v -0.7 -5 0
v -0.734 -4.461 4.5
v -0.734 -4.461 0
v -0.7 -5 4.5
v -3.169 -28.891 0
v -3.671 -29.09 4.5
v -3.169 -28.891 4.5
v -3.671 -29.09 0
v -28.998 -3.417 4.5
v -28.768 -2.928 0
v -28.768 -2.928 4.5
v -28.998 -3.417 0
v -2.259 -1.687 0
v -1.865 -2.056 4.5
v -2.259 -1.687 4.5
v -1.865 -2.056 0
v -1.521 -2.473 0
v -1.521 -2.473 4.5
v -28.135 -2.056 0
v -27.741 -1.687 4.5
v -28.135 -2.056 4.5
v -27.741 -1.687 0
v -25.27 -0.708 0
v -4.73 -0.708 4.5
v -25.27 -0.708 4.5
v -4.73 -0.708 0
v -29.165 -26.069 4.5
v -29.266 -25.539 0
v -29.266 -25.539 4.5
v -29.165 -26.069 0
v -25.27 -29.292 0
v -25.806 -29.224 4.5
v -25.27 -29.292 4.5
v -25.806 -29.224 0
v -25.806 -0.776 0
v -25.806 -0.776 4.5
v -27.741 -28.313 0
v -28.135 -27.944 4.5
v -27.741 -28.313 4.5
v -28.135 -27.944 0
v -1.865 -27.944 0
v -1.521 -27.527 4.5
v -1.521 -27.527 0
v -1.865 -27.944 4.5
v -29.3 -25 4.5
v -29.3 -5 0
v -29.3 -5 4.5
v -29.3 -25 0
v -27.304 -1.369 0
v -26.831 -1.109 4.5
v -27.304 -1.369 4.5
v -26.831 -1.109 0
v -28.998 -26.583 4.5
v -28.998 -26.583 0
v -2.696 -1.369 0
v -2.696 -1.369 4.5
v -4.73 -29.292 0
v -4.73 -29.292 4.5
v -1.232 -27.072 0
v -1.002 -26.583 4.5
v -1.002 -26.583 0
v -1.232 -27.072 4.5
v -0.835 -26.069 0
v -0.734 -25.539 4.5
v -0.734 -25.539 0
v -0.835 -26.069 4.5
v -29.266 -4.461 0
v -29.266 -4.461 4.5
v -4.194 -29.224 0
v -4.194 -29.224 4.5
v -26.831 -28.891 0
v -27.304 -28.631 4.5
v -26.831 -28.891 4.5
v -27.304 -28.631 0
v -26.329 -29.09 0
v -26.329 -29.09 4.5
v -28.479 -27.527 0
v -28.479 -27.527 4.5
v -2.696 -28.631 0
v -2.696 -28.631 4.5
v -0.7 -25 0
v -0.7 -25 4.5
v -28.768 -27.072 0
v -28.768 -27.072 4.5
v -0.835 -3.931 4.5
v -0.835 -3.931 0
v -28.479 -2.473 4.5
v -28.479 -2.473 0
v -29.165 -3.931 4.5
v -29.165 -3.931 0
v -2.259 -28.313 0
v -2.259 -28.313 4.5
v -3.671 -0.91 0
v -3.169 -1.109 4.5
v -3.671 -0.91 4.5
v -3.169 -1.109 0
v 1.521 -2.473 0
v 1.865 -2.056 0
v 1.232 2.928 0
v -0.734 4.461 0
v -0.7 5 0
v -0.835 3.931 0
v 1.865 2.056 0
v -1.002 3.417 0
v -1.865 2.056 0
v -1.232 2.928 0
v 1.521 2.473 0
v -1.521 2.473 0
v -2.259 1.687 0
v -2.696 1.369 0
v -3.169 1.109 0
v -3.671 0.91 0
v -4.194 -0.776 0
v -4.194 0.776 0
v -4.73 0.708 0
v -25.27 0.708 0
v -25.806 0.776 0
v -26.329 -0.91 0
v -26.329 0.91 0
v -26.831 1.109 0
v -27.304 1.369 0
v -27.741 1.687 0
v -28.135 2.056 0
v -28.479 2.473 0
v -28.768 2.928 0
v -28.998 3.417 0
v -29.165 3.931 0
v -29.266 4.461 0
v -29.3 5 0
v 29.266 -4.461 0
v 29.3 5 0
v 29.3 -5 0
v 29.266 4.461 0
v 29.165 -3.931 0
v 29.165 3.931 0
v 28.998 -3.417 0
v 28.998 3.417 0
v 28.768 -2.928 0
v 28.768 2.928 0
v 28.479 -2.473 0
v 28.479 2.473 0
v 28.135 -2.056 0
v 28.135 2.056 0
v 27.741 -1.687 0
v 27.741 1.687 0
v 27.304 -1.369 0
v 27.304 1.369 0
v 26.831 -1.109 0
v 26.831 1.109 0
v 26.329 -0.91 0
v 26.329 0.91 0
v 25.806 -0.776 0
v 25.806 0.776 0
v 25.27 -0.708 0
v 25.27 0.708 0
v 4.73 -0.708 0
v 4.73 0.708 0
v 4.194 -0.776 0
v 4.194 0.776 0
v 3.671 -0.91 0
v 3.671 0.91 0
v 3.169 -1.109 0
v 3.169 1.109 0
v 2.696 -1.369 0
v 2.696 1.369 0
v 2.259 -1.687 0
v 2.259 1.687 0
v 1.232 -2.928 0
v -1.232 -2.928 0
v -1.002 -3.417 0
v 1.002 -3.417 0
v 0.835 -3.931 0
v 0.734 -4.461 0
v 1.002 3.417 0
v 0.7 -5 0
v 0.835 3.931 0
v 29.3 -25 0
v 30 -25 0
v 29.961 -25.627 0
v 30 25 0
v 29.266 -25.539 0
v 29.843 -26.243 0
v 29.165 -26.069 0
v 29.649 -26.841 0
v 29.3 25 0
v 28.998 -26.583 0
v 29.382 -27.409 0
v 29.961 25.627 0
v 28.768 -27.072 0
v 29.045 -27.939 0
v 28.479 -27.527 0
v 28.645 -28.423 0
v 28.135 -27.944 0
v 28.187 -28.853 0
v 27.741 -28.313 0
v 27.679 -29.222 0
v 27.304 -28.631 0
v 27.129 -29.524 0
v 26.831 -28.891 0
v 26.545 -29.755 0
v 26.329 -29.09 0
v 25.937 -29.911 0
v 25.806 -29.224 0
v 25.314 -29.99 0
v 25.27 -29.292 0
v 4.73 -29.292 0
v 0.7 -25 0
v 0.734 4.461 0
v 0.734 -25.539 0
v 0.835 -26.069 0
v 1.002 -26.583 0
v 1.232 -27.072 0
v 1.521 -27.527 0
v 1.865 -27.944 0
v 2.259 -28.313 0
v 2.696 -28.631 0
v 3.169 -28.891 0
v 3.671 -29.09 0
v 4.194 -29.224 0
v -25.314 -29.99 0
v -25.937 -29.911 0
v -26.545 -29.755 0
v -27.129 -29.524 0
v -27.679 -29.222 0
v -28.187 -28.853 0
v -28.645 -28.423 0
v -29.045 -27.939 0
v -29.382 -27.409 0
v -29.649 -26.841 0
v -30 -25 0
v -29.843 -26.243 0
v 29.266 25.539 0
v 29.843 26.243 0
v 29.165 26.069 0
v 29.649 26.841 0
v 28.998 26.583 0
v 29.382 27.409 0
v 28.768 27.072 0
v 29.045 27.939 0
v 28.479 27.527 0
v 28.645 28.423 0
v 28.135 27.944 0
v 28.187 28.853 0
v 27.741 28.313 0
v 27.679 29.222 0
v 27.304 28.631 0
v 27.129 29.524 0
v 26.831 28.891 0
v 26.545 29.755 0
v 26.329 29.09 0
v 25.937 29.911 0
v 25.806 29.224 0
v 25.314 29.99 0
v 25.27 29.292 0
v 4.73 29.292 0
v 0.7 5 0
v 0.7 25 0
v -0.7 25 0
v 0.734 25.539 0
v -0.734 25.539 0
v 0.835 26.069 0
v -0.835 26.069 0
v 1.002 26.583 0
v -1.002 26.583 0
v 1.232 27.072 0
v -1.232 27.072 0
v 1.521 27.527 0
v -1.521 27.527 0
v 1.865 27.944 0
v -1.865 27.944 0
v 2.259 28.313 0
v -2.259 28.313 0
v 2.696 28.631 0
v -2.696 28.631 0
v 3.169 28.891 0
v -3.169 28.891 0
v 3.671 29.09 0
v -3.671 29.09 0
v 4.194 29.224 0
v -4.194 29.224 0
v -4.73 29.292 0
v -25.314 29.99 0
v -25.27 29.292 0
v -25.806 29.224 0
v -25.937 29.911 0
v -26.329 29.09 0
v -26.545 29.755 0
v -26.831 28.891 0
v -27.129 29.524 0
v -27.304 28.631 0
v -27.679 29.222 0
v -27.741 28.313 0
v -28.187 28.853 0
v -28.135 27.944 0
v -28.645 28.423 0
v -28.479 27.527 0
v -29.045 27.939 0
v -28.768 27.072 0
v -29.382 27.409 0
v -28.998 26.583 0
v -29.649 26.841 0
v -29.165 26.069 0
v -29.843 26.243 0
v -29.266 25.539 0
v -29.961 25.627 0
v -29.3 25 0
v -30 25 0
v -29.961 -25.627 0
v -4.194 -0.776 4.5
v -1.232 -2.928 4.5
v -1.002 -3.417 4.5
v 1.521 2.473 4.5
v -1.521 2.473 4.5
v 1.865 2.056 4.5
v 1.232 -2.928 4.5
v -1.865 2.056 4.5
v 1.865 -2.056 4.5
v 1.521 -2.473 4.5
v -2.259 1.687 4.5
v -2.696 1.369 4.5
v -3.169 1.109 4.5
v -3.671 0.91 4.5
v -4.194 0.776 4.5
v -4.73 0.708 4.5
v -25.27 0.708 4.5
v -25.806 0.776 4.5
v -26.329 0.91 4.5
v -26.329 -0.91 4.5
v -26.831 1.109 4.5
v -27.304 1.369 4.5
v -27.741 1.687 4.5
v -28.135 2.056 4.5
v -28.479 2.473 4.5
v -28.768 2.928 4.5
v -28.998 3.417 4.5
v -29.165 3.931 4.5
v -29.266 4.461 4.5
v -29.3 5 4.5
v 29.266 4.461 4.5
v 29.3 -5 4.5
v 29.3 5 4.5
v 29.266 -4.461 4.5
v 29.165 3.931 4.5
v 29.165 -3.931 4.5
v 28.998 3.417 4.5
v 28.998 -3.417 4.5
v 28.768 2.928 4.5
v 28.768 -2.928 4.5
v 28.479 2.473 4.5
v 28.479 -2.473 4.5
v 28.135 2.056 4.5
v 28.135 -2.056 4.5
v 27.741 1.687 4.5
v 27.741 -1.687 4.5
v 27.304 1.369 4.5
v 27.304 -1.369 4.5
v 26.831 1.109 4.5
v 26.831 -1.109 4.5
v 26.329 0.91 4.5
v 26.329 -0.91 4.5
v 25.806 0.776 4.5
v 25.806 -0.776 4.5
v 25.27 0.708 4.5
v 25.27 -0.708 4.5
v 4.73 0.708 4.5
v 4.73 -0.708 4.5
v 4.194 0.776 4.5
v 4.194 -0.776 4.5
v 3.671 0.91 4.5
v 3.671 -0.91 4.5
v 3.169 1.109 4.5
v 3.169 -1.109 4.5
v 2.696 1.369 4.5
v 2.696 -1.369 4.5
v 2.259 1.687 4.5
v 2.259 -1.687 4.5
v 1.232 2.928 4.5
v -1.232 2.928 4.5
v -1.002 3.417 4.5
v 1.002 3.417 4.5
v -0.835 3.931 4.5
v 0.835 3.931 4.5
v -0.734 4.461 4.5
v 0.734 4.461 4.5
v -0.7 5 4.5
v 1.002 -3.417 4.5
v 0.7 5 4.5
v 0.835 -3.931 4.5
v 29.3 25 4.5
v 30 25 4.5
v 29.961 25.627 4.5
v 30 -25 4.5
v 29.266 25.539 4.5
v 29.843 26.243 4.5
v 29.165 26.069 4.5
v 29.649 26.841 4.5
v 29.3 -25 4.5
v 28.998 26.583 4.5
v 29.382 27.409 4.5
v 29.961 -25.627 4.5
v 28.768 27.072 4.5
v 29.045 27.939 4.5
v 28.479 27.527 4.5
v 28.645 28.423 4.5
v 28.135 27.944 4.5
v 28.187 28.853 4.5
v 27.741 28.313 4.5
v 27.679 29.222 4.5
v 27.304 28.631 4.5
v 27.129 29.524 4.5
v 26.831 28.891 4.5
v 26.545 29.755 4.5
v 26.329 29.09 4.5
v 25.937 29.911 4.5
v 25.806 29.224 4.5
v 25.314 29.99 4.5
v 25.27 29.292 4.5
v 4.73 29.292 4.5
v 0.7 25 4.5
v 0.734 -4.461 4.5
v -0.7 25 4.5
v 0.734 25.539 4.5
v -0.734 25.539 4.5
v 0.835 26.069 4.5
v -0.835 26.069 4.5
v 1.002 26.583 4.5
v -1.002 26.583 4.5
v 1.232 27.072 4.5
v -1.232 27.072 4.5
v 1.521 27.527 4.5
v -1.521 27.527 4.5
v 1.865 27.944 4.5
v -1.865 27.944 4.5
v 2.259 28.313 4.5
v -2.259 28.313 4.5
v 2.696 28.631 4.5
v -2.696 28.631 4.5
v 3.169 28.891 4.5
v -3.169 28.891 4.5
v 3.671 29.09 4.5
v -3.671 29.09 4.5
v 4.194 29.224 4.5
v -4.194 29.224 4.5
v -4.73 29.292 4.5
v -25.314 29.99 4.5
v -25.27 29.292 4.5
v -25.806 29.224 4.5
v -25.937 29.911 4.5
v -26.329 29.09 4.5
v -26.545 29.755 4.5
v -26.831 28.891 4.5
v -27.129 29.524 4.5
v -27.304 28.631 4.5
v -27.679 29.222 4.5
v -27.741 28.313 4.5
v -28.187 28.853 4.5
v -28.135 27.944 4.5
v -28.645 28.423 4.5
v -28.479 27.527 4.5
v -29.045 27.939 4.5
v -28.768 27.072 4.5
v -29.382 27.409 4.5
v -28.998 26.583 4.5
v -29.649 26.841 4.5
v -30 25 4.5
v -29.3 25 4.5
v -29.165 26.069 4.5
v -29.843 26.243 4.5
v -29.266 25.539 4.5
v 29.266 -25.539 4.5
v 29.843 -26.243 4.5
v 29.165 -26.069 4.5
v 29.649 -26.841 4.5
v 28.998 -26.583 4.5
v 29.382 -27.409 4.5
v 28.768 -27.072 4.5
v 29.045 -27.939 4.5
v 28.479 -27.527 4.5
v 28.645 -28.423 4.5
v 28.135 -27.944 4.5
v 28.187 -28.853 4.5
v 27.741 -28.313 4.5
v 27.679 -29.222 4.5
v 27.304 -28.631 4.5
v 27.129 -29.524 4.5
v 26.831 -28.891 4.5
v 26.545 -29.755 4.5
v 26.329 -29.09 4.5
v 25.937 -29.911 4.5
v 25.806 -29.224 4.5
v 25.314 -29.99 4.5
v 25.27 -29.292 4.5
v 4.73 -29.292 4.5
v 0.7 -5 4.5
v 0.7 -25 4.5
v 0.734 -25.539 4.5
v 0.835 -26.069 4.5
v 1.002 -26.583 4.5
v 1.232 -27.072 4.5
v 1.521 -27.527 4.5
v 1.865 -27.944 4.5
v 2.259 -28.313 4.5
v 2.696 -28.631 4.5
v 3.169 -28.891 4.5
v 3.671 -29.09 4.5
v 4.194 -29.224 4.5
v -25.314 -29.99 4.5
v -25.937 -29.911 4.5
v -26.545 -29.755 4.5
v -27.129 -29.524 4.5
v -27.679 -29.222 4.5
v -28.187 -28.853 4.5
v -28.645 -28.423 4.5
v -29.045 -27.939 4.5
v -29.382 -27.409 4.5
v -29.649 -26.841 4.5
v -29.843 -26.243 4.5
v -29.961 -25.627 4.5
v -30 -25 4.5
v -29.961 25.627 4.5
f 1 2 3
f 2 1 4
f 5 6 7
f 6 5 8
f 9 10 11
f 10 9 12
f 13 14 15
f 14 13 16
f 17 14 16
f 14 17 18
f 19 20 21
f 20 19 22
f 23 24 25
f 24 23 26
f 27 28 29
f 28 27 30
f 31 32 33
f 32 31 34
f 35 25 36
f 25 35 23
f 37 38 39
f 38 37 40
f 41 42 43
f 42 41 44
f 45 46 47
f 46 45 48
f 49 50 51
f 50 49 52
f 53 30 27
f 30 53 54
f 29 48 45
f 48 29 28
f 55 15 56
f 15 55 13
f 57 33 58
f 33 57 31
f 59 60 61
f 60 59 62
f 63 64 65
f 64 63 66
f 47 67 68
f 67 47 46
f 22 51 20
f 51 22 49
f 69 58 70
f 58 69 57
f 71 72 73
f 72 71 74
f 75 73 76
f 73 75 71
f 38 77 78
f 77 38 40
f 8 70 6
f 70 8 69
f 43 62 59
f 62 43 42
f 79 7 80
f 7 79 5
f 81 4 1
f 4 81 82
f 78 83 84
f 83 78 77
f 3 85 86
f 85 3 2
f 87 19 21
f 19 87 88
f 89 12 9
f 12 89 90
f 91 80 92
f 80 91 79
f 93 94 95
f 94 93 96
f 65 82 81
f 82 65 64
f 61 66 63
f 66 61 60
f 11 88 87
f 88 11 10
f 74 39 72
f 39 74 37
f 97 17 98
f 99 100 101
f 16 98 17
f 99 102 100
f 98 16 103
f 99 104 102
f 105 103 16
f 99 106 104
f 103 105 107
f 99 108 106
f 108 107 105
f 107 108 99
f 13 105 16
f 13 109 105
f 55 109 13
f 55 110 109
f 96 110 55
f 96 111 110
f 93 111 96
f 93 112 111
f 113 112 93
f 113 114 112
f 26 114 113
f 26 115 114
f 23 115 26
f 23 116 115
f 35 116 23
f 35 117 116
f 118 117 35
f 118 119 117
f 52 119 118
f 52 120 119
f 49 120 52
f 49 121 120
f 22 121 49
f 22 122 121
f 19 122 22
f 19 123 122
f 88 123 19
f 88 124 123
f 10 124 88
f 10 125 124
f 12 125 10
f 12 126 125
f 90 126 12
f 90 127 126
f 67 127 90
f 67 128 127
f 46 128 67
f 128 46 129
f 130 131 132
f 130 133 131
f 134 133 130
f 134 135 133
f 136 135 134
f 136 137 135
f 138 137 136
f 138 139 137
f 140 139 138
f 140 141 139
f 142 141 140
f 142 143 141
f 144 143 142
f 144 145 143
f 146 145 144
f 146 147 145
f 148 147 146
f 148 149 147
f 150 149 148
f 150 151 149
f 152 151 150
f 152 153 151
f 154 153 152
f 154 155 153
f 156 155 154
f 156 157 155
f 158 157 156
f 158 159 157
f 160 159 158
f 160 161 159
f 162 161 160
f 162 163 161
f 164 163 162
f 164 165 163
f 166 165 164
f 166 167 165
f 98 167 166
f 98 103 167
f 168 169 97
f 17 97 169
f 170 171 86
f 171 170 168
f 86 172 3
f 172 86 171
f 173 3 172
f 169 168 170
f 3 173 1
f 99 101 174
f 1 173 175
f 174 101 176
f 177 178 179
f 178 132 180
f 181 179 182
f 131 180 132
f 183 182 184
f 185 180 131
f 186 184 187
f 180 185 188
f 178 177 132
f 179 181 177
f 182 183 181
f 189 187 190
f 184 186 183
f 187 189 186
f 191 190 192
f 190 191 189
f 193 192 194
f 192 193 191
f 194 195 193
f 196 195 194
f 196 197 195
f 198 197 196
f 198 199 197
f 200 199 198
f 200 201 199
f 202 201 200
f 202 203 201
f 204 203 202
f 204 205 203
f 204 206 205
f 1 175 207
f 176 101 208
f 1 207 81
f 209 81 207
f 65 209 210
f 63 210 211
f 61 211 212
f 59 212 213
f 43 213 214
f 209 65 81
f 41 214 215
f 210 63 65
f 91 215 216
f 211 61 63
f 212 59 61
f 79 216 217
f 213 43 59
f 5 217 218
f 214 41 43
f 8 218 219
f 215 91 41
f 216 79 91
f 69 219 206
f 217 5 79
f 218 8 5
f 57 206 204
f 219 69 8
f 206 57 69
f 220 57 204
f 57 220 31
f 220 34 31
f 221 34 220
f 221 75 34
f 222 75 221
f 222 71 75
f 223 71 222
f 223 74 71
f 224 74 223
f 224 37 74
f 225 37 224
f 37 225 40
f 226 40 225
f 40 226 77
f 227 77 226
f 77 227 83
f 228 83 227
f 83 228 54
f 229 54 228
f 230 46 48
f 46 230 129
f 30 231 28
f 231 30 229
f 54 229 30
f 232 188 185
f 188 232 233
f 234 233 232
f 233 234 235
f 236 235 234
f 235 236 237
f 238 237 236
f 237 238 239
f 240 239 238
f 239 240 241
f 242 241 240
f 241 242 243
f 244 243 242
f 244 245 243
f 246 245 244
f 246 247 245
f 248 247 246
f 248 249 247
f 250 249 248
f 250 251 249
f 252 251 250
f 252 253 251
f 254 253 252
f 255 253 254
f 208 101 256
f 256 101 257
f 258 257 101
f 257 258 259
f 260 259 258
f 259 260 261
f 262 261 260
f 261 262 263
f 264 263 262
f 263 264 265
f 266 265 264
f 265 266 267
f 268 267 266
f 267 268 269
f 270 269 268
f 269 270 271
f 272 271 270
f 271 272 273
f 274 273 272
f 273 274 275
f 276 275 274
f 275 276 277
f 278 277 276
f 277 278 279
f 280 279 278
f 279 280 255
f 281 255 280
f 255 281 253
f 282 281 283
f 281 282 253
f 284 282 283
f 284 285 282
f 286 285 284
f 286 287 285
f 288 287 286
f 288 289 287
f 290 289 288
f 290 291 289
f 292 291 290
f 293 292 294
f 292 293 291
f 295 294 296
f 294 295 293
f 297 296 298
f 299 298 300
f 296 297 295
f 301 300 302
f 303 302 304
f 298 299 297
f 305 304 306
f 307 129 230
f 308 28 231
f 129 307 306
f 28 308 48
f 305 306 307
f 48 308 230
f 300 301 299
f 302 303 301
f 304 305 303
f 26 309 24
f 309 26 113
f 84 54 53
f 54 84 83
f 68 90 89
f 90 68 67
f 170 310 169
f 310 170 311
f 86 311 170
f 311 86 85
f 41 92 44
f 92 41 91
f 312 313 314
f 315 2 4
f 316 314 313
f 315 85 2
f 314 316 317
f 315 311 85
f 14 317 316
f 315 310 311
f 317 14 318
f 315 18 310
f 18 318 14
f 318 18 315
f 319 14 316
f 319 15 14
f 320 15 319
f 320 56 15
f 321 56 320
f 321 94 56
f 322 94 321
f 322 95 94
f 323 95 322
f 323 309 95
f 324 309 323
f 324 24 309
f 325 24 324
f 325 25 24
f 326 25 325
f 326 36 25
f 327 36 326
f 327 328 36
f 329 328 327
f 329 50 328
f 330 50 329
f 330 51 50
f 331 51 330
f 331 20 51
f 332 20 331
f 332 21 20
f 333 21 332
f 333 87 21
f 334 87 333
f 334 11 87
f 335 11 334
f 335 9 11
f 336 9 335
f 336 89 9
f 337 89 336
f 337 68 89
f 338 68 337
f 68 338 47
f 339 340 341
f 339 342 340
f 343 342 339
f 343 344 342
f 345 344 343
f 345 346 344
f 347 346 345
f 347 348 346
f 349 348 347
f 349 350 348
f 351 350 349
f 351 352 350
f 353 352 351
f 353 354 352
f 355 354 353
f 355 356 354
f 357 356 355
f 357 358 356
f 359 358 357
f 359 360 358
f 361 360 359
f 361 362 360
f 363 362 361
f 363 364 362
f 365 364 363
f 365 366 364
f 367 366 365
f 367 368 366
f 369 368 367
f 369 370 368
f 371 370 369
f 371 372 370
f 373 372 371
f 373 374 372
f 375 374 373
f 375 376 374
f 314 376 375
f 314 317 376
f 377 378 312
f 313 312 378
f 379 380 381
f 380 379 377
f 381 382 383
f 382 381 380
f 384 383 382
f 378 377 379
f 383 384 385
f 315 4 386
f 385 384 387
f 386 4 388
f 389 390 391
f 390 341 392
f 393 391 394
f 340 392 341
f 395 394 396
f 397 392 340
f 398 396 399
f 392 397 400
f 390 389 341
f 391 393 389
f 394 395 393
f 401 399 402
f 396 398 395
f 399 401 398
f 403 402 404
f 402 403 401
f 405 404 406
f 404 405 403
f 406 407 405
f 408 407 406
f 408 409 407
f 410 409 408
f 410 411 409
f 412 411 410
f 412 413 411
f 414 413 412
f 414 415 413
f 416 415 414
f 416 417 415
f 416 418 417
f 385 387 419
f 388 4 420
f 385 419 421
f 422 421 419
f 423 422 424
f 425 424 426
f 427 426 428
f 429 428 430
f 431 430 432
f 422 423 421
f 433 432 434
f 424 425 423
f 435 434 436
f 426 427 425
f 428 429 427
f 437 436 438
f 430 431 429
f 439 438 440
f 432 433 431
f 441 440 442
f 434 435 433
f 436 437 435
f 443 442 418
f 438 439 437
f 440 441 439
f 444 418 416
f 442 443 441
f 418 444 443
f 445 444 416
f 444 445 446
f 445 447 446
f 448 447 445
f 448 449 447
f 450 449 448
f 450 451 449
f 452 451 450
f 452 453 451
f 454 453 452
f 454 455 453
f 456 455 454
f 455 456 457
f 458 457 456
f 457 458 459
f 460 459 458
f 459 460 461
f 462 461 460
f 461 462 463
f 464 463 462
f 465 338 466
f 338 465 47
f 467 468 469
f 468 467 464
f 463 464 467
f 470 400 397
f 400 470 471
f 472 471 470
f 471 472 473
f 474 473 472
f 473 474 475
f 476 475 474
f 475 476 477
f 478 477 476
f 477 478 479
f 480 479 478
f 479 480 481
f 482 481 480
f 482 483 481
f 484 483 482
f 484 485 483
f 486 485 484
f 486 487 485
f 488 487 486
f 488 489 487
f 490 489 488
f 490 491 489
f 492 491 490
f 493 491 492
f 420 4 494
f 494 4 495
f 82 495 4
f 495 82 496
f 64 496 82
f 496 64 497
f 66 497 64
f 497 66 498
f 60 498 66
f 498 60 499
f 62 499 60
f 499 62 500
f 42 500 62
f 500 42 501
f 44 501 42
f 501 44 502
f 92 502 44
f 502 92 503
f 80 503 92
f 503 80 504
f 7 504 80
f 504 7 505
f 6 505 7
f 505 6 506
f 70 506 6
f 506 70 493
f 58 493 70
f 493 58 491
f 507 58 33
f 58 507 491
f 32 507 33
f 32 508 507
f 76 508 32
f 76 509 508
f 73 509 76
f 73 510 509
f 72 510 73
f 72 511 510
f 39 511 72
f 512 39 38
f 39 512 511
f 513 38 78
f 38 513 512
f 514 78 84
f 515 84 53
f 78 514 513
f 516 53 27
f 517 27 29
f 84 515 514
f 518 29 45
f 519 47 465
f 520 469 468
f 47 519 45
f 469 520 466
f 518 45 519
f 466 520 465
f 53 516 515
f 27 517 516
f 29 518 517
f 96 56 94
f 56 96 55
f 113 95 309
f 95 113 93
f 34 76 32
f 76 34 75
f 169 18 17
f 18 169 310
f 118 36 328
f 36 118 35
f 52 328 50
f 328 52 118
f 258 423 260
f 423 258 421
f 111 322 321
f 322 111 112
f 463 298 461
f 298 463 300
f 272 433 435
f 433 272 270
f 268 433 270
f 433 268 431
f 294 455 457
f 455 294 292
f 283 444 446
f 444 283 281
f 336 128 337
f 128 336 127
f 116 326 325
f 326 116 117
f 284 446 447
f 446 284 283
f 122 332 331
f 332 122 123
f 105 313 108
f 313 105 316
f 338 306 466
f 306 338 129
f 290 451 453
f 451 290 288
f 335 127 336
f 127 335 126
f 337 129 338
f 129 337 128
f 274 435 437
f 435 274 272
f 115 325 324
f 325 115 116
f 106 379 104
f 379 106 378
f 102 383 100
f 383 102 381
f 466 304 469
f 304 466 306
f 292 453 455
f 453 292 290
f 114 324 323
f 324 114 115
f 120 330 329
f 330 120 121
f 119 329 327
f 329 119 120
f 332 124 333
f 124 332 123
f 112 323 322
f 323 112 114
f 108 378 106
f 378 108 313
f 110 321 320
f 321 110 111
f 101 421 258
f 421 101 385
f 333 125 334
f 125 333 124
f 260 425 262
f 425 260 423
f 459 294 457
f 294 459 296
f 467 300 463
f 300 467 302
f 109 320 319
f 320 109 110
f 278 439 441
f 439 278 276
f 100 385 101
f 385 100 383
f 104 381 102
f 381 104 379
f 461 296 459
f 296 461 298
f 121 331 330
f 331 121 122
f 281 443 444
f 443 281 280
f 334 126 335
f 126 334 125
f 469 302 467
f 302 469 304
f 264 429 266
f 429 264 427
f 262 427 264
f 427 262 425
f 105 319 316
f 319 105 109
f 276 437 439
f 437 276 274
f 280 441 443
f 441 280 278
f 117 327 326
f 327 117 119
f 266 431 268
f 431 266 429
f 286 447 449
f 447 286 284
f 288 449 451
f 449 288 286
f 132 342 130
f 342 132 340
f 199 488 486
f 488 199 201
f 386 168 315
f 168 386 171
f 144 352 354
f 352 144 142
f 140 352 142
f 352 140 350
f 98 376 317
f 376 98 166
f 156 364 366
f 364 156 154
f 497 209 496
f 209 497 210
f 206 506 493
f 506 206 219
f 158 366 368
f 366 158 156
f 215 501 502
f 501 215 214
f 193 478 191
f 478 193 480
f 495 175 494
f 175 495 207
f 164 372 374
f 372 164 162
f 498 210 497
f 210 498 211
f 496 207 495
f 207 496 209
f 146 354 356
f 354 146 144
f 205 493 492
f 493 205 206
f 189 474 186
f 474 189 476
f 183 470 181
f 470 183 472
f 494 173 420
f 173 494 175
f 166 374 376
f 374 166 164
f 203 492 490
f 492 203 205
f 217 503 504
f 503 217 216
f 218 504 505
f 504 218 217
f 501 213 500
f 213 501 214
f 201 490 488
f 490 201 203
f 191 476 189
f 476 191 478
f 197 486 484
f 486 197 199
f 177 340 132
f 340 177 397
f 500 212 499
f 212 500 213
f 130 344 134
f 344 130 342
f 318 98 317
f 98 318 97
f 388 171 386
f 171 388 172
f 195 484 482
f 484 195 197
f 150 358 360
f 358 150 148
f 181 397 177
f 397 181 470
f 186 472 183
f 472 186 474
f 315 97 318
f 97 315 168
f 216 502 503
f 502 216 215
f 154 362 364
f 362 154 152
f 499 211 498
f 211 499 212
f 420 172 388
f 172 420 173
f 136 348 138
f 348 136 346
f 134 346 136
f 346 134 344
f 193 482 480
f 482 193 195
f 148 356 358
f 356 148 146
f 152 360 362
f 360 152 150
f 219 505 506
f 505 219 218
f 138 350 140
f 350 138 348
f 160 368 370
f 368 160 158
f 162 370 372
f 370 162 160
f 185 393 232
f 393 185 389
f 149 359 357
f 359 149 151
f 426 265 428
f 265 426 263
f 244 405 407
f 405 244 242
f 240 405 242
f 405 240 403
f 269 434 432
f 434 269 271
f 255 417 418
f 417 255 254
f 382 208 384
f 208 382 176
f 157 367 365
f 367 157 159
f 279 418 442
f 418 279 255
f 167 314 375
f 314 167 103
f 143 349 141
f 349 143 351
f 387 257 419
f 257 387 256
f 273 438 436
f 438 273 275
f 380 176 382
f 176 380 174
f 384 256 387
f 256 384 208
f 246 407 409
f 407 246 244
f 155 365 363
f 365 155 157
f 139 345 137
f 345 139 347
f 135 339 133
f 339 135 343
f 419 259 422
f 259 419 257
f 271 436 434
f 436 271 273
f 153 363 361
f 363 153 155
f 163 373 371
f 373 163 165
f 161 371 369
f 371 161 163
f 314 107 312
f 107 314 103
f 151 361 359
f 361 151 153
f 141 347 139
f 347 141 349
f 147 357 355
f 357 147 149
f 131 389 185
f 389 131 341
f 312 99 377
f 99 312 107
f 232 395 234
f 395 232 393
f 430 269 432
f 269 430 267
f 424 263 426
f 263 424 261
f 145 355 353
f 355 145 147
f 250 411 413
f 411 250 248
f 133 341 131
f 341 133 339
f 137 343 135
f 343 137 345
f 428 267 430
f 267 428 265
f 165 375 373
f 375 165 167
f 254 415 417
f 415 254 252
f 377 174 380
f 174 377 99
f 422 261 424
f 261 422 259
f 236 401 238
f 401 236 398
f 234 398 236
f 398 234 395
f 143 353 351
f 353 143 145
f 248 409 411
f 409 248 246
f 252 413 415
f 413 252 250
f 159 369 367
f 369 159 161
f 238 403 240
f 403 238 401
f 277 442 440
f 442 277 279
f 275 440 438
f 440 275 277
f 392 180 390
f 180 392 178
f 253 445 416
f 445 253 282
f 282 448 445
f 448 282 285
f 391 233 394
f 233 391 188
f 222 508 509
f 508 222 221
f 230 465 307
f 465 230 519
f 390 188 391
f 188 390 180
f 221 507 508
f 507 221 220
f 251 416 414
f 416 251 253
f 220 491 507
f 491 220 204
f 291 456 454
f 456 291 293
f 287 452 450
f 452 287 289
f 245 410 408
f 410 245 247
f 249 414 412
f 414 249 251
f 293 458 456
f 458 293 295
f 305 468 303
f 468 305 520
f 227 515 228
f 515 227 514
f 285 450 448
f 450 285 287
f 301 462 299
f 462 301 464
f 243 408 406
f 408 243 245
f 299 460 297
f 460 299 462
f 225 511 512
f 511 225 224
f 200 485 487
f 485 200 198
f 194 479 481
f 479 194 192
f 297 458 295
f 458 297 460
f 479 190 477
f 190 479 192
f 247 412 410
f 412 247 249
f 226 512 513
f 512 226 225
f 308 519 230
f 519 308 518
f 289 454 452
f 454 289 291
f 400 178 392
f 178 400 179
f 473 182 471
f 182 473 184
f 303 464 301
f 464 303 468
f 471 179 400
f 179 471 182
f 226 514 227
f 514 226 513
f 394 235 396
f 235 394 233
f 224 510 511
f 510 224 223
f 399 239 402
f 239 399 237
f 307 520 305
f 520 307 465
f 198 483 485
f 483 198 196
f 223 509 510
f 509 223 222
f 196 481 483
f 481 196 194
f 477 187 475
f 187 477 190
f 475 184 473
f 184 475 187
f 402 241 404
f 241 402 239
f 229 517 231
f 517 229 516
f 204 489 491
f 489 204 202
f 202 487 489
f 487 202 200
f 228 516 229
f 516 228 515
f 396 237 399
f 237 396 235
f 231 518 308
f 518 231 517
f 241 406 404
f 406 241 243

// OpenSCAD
$fn = 50;


difference() {
	union() {
		hull() {
			translate(v = [-25.0000000000, 25.0000000000, 0]) {
				cylinder(h = 4.5000000000, r = 5);
			}
			translate(v = [25.0000000000, 25.0000000000, 0]) {
				cylinder(h = 4.5000000000, r = 5);
			}
			translate(v = [-25.0000000000, -25.0000000000, 0]) {
				cylinder(h = 4.5000000000, r = 5);
			}
			translate(v = [25.0000000000, -25.0000000000, 0]) {
				cylinder(h = 4.5000000000, r = 5);
			}
		}
	}
	union() {
		translate(v = [-15.0000000000, -15.0000000000, 0]) {
			hull() {
				translate(v = [-10.0000000000, 10.0000000000, 0]) {
					cylinder(h = 4.5000000000, r = 4.3000000000);
				}
				translate(v = [10.0000000000, 10.0000000000, 0]) {
					cylinder(h = 4.5000000000, r = 4.3000000000);
				}
				translate(v = [-10.0000000000, -10.0000000000, 0]) {
					cylinder(h = 4.5000000000, r = 4.3000000000);
				}
				translate(v = [10.0000000000, -10.0000000000, 0]) {
					cylinder(h = 4.5000000000, r = 4.3000000000);
				}
			}
		}
		translate(v = [-15.0000000000, 15.0000000000, 0]) {
			hull() {
				translate(v = [-10.0000000000, 10.0000000000, 0]) {
					cylinder(h = 4.5000000000, r = 4.3000000000);
				}
				translate(v = [10.0000000000, 10.0000000000, 0]) {
					cylinder(h = 4.5000000000, r = 4.3000000000);
				}
				translate(v = [-10.0000000000, -10.0000000000, 0]) {
					cylinder(h = 4.5000000000, r = 4.3000000000);
				}
				translate(v = [10.0000000000, -10.0000000000, 0]) {
					cylinder(h = 4.5000000000, r = 4.3000000000);
				}
			}
		}
		translate(v = [15.0000000000, -15.0000000000, 0]) {
			hull() {
				translate(v = [-10.0000000000, 10.0000000000, 0]) {
					cylinder(h = 4.5000000000, r = 4.3000000000);
				}
				translate(v = [10.0000000000, 10.0000000000, 0]) {
					cylinder(h = 4.5000000000, r = 4.3000000000);
				}
				translate(v = [-10.0000000000, -10.0000000000, 0]) {
					cylinder(h = 4.5000000000, r = 4.3000000000);
				}
				translate(v = [10.0000000000, -10.0000000000, 0]) {
					cylinder(h = 4.5000000000, r = 4.3000000000);
				}
			}
		}
		translate(v = [15.0000000000, 15.0000000000, 0]) {
			hull() {
				translate(v = [-10.0000000000, 10.0000000000, 0]) {
					cylinder(h = 4.5000000000, r = 4.3000000000);
				}
				translate(v = [10.0000000000, 10.0000000000, 0]) {
					cylinder(h = 4.5000000000, r = 4.3000000000);
				}
				translate(v = [-10.0000000000, -10.0000000000, 0]) {
					cylinder(h = 4.5000000000, r = 4.3000000000);
				}
				translate(v = [10.0000000000, -10.0000000000, 0]) {
					cylinder(h = 4.5000000000, r = 4.3000000000);
				}
			}
		}
	}
}
